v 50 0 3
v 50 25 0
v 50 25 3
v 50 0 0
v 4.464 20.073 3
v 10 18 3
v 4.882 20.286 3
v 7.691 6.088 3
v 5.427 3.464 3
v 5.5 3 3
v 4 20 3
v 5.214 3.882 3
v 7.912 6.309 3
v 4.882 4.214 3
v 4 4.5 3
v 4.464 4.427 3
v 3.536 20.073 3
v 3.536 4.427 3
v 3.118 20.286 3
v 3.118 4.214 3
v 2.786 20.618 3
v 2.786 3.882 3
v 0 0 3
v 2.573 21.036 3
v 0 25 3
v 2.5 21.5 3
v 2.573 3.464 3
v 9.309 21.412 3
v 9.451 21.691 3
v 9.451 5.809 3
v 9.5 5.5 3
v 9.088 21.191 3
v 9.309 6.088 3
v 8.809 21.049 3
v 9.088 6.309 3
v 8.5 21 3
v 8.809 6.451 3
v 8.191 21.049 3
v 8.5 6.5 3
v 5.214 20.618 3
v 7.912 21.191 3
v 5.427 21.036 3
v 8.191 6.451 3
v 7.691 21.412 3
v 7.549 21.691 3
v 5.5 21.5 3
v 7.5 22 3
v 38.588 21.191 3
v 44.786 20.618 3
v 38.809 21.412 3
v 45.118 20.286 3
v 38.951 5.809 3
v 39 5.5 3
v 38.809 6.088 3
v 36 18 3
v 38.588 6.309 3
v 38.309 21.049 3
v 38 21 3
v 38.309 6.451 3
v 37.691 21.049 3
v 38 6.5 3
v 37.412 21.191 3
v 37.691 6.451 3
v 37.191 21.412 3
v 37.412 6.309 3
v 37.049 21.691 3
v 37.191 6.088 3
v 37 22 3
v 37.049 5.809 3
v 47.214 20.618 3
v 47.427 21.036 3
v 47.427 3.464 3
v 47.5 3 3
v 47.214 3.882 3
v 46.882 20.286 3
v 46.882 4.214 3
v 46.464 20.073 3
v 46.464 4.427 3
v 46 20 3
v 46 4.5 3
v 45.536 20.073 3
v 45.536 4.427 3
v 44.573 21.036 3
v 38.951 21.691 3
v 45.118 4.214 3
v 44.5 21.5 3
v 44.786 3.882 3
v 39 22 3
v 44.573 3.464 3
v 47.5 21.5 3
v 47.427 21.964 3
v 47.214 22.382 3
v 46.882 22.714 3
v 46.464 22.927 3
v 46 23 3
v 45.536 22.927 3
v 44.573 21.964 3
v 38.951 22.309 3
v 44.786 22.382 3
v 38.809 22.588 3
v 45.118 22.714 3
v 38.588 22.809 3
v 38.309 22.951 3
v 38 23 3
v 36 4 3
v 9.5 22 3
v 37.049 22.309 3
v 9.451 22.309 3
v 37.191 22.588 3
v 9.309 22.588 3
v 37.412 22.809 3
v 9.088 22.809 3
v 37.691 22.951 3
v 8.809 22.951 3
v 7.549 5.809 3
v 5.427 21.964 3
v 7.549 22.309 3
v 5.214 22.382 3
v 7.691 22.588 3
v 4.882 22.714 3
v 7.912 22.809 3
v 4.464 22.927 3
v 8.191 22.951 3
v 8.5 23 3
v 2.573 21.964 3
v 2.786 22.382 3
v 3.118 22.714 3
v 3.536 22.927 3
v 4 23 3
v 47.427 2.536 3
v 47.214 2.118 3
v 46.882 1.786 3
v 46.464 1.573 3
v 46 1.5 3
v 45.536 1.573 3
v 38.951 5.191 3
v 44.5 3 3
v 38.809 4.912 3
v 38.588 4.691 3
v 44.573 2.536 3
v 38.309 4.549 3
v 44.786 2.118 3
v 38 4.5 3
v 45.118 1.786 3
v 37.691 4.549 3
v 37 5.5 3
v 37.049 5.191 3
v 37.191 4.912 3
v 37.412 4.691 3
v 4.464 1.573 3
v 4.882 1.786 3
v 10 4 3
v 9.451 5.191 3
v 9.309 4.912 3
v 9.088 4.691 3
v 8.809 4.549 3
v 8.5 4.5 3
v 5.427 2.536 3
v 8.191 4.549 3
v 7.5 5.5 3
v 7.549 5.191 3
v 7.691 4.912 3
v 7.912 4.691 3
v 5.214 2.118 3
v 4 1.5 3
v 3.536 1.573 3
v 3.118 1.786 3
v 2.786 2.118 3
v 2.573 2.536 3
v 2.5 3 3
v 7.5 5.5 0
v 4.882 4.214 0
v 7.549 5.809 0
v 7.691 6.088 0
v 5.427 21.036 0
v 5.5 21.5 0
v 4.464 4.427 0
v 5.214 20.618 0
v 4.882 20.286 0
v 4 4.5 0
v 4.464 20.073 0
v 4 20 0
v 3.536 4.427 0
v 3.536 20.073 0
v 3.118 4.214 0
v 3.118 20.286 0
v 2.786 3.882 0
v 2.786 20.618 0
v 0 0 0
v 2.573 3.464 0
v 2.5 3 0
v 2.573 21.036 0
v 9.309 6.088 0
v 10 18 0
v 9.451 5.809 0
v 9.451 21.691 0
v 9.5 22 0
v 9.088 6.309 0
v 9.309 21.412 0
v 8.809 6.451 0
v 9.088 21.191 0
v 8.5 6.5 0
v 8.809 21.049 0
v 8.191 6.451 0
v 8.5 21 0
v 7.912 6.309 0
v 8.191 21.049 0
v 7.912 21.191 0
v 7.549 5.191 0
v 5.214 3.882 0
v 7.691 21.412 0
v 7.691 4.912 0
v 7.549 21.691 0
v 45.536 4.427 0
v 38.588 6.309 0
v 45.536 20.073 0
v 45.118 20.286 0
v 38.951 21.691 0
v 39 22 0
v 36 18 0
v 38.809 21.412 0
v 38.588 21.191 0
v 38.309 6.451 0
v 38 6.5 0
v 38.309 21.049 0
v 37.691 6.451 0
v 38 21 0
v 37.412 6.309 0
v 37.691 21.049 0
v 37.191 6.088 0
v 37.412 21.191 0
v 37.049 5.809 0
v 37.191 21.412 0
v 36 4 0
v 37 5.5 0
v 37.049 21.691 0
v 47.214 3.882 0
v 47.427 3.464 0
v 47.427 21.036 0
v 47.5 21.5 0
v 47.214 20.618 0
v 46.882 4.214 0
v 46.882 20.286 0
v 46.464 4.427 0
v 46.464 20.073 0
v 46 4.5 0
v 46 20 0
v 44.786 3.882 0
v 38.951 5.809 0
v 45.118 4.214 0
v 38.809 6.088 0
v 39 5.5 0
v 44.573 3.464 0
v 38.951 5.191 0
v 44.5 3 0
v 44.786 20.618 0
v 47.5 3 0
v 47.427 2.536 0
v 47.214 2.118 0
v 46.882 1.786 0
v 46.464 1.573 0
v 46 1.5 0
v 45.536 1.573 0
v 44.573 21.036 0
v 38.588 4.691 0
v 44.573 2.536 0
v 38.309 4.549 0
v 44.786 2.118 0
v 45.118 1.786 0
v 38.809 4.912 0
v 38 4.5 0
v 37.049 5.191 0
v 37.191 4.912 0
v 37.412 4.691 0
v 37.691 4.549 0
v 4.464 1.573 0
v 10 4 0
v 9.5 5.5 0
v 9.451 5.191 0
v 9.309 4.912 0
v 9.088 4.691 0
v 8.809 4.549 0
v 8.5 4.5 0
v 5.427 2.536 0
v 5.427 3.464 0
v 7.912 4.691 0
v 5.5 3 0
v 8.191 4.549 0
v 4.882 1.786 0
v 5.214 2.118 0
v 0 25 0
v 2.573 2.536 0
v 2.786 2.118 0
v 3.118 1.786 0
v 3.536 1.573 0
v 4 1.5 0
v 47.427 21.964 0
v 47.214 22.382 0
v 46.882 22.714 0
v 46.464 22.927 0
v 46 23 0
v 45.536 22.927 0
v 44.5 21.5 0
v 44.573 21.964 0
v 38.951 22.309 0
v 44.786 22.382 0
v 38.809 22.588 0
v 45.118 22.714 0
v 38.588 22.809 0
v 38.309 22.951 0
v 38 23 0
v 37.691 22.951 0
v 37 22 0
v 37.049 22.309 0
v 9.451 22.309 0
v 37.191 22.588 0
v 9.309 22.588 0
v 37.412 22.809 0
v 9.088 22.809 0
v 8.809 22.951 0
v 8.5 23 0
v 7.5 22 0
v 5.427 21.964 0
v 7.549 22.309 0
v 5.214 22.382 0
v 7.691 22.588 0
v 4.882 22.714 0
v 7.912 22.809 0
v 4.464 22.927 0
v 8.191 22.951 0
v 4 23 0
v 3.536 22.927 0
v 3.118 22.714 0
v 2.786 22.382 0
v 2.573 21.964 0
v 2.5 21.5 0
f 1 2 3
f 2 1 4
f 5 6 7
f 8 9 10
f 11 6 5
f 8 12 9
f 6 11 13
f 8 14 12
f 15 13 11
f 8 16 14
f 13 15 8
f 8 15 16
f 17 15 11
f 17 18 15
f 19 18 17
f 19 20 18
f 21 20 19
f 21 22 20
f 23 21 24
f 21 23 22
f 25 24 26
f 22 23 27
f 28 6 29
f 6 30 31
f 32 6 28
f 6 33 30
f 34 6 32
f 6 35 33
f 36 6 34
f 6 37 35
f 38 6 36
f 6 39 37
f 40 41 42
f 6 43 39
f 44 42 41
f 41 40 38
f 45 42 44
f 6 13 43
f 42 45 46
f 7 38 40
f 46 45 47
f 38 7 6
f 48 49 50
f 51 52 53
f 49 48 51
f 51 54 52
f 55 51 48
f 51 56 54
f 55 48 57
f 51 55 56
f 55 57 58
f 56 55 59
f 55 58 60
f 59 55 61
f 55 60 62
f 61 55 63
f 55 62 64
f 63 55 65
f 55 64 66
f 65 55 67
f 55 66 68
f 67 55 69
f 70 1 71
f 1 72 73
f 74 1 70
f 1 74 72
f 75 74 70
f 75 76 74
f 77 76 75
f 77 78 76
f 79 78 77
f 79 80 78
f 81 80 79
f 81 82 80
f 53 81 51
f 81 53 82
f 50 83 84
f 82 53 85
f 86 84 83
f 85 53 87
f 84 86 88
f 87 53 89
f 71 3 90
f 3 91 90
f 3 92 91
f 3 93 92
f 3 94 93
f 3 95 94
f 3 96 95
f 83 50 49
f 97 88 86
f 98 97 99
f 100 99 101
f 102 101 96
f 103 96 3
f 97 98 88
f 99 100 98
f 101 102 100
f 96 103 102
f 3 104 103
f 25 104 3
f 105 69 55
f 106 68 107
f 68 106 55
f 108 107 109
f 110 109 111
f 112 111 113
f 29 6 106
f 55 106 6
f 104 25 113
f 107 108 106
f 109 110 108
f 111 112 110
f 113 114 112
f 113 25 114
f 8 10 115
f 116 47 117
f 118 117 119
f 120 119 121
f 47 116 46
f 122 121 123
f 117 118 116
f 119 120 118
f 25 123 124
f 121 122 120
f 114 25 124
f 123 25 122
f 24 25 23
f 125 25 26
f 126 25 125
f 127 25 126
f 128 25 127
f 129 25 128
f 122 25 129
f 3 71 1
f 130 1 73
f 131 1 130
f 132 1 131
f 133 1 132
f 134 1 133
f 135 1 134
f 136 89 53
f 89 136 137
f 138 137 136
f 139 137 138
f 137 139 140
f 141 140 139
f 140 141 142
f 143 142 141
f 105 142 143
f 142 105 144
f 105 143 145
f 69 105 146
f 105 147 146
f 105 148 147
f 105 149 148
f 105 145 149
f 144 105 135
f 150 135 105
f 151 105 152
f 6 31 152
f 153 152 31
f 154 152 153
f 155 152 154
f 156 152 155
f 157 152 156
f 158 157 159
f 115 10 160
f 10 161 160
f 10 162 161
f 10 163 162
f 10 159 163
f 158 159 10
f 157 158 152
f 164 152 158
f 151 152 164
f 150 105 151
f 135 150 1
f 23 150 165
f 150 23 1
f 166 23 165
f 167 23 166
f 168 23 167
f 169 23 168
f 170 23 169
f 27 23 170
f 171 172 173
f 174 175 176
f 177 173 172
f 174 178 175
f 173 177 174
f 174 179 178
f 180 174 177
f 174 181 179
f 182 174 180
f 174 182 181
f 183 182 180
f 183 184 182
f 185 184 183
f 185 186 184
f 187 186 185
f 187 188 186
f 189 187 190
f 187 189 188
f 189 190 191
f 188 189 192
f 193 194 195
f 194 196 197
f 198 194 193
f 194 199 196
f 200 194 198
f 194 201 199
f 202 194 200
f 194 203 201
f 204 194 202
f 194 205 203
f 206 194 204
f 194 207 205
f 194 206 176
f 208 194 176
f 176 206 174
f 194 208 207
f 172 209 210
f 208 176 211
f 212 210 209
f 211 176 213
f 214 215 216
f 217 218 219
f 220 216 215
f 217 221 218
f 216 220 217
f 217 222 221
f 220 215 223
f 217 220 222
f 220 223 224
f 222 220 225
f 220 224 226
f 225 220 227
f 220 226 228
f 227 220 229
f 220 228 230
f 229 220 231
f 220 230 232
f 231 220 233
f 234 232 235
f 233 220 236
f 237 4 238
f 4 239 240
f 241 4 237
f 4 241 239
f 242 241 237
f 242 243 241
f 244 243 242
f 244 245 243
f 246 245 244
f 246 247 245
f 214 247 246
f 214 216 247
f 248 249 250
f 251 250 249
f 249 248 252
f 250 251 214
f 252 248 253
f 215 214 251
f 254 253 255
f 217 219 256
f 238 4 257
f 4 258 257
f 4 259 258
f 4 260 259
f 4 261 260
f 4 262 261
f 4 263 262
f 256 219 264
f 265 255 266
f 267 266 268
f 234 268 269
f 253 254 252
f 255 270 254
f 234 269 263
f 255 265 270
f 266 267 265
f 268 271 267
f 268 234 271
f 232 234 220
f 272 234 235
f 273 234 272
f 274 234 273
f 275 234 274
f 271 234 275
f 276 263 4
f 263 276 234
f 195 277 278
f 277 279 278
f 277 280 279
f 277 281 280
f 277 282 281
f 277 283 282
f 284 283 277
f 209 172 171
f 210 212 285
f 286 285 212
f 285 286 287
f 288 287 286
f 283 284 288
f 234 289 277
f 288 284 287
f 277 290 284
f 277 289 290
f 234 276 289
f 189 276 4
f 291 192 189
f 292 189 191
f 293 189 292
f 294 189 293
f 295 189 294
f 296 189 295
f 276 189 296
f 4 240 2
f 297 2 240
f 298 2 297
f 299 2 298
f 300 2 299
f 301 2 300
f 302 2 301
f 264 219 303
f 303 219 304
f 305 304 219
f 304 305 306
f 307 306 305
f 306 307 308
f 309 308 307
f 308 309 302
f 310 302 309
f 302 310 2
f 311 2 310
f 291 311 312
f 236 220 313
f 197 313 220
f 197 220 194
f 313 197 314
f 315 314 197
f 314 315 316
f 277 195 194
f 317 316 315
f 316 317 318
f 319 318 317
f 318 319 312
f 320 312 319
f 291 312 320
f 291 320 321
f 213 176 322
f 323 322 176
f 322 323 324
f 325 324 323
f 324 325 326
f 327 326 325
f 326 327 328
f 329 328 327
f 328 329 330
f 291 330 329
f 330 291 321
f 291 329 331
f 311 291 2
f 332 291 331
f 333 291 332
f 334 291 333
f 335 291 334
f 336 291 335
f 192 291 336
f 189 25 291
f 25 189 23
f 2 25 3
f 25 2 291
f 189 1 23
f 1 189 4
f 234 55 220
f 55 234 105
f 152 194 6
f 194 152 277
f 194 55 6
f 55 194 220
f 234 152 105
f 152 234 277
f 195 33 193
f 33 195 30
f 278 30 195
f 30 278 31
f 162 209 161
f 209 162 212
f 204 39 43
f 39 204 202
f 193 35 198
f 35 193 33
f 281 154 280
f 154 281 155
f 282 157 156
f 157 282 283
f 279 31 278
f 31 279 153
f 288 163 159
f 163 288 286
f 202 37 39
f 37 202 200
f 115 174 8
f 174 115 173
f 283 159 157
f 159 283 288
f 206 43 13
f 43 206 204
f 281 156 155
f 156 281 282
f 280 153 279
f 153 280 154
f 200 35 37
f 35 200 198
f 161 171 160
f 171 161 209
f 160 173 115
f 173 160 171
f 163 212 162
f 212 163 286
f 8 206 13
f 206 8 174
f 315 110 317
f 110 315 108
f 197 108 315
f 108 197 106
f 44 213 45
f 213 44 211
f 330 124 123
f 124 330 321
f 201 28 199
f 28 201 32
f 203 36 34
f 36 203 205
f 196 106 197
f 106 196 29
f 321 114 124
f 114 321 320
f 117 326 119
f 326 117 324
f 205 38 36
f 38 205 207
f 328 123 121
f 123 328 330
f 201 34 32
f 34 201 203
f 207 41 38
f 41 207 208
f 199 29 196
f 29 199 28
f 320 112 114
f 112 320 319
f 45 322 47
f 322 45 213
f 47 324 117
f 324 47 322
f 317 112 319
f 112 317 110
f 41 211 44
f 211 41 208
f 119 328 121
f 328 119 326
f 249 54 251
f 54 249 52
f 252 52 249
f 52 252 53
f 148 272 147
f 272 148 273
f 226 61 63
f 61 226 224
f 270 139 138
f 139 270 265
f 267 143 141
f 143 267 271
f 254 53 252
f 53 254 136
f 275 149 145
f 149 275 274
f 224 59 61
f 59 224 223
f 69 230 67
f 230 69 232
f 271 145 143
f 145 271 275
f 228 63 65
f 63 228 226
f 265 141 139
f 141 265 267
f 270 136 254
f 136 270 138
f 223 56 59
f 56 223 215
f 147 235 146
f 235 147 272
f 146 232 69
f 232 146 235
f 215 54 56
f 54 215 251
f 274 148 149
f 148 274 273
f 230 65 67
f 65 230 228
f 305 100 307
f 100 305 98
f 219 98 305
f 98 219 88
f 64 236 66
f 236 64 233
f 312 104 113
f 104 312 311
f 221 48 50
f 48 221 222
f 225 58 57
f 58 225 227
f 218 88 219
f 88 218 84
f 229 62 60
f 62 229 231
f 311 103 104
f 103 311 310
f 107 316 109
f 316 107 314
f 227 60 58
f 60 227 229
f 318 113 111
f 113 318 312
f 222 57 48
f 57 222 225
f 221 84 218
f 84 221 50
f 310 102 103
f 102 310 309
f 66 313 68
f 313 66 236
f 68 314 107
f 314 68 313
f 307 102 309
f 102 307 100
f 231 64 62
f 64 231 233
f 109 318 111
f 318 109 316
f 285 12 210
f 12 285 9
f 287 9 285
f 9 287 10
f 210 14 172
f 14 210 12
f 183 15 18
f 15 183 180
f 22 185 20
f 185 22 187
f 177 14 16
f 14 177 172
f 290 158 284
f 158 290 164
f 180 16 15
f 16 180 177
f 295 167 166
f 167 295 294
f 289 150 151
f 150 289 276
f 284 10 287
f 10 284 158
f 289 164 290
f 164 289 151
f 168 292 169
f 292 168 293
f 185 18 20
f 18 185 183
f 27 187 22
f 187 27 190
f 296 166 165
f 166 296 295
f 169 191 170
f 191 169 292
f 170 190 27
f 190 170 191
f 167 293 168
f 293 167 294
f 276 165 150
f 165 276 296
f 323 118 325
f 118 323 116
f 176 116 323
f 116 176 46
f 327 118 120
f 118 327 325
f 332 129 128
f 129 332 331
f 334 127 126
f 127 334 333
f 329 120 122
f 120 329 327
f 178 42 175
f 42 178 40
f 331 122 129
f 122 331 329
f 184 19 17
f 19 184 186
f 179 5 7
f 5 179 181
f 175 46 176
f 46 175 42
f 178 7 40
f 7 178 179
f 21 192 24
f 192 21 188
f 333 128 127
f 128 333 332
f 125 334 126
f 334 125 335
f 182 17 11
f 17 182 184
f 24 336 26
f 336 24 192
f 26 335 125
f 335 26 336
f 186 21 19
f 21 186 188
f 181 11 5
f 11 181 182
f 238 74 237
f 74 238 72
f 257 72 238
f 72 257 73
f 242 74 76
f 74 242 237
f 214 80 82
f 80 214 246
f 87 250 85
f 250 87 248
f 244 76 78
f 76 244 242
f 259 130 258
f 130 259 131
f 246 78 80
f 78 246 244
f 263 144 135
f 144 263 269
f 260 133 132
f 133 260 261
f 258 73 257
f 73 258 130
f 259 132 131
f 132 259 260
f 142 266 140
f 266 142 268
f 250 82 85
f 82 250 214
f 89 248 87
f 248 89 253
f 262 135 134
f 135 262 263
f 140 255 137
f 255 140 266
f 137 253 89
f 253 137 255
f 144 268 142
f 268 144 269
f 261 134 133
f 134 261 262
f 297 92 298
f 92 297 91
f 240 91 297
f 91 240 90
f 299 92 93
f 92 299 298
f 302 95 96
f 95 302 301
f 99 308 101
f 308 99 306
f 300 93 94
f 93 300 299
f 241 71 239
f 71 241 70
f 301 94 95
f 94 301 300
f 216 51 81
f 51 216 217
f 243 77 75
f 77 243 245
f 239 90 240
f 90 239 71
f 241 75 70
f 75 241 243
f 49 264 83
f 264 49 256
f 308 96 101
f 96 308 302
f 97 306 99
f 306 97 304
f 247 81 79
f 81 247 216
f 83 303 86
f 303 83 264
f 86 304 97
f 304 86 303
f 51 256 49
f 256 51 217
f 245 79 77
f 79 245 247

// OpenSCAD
// circuit cover

$fn=20;
module circuitCover(){
    difference(){
        cube([50, 25, 3]);
        translate([10,4, -1]) cube([26,14, 5]);
        translate([10-1.5, 4+1.5, -1]) cylinder(d=2, h=5);
        translate([10-1.5, 4+13.5 + 4.5, -1]) cylinder(d=2, h=5);
        translate([10+25.5+2.5, 4+1.5, -1]) cylinder(d=2, h=5);
        translate([10+25.5+2.5, 4+13.5+4.5, -1]) cylinder(d=2, h=5);
        
        translate([4,3,-1]) cylinder(d=3,h=5);
        translate([4, 3+18.5, -1]) cylinder(d=3, h=5);
        translate([4 + 42,3,-1]) cylinder(d=3,h=5);
        translate([4 + 42, 3+18.5, -1]) cylinder(d=3, h=5);

    }   
}

circuitCover();
